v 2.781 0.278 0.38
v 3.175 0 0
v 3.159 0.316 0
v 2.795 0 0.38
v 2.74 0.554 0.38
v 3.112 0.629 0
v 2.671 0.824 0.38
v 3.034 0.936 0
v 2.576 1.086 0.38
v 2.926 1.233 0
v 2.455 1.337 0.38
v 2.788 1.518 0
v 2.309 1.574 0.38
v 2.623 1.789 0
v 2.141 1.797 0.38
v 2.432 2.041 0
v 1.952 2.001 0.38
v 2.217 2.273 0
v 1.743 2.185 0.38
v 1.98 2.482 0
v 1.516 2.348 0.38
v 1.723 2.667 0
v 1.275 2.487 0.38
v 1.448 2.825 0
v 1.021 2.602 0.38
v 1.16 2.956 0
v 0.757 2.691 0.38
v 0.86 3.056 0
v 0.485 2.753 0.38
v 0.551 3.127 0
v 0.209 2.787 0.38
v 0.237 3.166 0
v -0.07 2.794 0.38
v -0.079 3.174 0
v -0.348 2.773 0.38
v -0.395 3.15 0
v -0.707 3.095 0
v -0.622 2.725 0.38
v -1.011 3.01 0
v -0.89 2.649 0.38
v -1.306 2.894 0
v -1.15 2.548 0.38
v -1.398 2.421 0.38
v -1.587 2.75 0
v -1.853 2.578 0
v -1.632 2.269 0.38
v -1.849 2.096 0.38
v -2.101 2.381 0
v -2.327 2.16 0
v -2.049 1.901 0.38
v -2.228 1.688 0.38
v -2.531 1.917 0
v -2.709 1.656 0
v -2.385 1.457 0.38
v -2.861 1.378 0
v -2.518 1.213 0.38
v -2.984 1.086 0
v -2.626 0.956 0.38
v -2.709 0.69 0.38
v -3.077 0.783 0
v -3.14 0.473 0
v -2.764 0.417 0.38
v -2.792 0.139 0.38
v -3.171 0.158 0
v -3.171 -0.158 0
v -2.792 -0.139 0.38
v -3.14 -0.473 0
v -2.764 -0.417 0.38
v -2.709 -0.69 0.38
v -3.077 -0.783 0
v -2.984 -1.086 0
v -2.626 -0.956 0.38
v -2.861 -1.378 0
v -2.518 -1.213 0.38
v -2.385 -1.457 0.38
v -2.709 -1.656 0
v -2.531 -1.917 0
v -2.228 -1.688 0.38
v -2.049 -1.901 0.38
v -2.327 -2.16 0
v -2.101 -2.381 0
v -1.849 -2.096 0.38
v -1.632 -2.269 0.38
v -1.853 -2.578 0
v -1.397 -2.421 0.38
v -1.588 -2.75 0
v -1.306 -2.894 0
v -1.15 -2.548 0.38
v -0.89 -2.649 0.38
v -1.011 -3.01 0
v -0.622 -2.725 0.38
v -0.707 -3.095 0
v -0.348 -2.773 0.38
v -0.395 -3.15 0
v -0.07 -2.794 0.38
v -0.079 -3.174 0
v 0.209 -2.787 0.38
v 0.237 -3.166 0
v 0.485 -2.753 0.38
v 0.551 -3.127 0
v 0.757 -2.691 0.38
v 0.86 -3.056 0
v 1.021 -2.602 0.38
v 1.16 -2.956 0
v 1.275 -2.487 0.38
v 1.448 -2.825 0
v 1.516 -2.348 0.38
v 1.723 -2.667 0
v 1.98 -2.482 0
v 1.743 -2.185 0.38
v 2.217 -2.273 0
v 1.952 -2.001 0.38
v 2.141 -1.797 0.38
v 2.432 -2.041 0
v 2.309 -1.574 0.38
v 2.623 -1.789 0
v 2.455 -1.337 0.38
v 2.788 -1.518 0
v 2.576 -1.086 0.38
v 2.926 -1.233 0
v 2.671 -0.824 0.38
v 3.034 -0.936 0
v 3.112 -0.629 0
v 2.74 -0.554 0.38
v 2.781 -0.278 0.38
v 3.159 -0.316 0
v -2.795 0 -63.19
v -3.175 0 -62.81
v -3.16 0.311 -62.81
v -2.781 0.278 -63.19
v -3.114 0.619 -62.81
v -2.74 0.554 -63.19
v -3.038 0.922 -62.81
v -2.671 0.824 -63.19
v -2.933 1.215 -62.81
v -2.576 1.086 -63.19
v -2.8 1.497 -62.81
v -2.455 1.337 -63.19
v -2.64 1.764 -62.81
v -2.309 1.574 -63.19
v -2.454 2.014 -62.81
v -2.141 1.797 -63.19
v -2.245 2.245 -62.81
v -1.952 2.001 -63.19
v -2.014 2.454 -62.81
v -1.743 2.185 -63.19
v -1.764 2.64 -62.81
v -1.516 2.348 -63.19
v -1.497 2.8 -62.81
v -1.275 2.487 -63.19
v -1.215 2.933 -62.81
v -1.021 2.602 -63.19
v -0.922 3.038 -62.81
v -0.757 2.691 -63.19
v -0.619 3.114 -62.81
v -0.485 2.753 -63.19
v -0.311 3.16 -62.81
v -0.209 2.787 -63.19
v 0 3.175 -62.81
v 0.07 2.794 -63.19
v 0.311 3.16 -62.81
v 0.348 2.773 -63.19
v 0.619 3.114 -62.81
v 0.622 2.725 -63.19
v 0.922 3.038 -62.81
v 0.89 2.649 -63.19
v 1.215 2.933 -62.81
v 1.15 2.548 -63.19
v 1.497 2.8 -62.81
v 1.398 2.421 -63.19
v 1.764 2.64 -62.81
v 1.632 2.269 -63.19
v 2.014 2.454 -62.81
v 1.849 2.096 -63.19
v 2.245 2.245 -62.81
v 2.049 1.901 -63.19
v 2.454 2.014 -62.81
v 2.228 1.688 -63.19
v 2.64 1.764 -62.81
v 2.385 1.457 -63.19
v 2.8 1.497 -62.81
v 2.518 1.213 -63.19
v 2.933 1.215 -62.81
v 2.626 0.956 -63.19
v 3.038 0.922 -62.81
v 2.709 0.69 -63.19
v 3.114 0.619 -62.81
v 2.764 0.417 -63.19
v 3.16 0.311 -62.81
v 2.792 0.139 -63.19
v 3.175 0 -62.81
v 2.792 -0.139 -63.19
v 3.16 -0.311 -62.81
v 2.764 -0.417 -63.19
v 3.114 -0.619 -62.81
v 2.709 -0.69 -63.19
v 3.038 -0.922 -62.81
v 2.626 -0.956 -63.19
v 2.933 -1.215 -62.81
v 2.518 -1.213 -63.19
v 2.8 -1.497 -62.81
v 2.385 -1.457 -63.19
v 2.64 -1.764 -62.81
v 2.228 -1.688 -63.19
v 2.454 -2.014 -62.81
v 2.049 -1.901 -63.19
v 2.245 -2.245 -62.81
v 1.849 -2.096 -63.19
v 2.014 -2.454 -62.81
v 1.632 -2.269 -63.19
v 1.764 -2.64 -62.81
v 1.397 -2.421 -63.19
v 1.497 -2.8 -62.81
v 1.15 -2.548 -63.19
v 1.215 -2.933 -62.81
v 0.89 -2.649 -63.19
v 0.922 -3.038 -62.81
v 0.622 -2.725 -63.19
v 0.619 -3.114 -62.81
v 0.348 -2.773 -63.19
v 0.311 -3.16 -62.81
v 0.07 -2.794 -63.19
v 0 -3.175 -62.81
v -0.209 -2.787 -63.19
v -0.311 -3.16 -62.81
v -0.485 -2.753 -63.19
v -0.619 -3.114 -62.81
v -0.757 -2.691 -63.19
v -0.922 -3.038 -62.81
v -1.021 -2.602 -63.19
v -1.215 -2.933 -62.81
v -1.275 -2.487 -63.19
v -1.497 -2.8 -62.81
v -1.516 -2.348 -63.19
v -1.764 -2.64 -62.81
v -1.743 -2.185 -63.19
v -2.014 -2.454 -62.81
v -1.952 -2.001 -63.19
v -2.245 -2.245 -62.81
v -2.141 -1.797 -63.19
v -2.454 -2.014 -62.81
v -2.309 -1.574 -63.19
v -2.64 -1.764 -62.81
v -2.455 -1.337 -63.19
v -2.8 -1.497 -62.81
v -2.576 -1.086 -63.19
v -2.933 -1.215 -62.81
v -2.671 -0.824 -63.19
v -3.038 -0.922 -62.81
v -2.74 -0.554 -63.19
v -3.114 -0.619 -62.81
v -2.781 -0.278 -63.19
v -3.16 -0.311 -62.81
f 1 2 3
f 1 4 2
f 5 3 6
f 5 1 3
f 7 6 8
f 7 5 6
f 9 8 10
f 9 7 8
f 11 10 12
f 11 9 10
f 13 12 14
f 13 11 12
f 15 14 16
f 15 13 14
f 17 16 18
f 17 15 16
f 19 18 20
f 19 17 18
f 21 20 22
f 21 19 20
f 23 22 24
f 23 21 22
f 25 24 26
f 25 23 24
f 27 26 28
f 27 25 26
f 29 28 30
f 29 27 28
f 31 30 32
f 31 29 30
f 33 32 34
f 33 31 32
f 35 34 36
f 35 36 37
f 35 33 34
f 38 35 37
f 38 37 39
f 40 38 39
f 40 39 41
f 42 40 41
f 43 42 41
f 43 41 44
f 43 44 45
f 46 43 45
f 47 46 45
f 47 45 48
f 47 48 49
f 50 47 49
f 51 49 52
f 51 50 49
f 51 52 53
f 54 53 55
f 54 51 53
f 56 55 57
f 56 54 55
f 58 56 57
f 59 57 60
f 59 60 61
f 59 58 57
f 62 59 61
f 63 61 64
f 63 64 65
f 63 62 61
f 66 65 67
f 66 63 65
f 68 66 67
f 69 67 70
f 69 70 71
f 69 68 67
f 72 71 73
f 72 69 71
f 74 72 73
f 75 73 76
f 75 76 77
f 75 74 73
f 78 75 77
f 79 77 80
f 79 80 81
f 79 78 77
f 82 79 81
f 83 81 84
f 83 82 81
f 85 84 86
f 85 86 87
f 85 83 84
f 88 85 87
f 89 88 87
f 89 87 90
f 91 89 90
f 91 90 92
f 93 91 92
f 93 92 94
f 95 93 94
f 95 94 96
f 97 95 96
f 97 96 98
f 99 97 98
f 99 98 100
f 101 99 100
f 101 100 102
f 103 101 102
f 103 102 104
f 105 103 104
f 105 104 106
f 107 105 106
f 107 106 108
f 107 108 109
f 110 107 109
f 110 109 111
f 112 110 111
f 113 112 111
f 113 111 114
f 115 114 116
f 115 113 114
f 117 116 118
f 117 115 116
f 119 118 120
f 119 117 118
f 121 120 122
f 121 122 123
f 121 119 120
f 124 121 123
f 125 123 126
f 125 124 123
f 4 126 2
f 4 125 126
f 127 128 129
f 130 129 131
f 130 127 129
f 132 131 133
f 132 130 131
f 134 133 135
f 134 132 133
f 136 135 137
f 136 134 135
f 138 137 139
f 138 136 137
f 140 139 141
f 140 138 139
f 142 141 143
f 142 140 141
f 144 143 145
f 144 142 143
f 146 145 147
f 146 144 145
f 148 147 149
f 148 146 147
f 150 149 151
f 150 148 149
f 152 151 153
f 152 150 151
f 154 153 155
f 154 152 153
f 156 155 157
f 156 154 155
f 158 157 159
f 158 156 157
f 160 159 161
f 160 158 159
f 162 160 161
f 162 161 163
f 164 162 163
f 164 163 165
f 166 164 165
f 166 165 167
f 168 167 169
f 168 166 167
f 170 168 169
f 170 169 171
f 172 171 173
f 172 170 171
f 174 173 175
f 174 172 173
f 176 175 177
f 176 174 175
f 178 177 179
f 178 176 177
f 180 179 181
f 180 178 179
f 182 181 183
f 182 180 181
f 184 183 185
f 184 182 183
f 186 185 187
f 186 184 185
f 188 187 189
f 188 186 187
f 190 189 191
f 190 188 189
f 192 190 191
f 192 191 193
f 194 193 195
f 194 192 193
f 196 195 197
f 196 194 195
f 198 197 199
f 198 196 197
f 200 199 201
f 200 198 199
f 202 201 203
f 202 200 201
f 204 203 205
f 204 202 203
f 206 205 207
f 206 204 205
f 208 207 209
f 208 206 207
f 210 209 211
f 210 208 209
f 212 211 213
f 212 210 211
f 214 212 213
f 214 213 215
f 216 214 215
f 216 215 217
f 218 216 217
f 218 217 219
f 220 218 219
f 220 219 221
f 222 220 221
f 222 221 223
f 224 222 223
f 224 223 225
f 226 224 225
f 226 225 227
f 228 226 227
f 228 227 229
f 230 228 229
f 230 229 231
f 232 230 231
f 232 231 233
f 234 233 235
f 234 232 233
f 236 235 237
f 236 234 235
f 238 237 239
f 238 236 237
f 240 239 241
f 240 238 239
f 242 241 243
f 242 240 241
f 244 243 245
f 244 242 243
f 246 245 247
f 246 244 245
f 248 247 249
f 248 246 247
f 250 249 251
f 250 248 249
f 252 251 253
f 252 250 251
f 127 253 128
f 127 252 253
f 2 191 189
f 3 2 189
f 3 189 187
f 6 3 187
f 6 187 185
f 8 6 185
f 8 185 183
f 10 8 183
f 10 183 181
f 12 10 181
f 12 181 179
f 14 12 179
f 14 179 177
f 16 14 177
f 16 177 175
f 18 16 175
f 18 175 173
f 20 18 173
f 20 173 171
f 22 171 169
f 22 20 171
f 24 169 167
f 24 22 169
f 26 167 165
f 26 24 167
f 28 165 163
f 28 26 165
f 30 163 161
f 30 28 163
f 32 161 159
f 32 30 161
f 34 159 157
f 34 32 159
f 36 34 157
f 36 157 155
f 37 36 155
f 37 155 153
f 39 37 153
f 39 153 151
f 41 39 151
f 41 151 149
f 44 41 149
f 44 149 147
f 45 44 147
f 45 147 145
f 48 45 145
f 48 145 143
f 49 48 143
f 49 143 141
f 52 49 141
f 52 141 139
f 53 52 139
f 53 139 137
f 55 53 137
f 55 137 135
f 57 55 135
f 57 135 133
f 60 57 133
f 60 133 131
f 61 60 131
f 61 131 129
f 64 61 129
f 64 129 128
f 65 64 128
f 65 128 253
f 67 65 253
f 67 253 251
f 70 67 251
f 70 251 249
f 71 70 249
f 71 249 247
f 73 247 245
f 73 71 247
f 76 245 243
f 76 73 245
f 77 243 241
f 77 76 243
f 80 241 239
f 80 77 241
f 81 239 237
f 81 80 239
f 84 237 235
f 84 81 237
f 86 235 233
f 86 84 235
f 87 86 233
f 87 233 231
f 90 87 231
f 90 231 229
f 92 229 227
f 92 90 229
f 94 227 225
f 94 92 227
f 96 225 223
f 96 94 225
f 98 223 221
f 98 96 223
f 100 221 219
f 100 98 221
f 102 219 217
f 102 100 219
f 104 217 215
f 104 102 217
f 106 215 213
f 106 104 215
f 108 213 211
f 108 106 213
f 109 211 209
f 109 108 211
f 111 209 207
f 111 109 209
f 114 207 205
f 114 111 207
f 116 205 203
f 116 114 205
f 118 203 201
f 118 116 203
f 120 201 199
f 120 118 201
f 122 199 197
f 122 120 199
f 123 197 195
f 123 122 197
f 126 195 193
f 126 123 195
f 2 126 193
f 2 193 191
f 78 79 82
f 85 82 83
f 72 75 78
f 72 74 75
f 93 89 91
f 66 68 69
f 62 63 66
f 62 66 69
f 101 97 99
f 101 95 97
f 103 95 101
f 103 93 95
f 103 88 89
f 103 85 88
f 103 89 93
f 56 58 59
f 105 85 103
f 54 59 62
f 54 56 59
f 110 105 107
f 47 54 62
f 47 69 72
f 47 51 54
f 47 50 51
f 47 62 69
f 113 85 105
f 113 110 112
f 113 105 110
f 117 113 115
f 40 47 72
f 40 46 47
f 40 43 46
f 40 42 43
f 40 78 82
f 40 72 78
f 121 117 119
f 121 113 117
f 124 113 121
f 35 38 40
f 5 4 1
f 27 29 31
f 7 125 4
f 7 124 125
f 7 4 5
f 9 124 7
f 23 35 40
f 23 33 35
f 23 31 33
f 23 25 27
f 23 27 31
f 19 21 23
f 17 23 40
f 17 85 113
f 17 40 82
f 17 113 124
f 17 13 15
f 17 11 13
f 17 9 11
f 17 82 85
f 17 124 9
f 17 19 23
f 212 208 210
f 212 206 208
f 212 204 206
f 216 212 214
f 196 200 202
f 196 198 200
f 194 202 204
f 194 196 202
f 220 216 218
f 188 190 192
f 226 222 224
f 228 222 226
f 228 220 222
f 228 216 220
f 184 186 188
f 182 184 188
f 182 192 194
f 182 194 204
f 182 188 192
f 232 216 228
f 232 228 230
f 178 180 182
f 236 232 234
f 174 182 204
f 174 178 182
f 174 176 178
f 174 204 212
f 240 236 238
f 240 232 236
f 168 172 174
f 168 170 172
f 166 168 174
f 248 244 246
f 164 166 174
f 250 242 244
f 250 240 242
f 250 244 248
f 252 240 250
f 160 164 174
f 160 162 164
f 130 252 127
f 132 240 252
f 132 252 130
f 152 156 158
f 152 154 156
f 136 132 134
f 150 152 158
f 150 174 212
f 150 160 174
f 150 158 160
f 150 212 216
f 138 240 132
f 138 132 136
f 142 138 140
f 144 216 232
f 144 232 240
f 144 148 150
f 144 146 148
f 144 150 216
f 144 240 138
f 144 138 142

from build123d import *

# Parameters (mm, degrees)
SKETCH2_R           = 3.175
BOSS_EXTRUDE1_DEPTH = 62.81
SKETCH3_R           = 3.175
BOSS_EXTRUDE2_DEPTH = 0.38
BOSS_EXTRUDE2_TAPER = 45
SKETCH4_R           = 3.175
BOSS_EXTRUDE3_DEPTH = 0.38
BOSS_EXTRUDE3_TAPER = 45


with BuildPart() as part:
    # Sketch2 → Boss-Extrude1 (new body)
    with BuildSketch(Plane.XY):
        Circle(SKETCH2_R)
    extrude(amount=-BOSS_EXTRUDE1_DEPTH)

    # Sketch3 → Boss-Extrude2 (add)
    with BuildSketch(Plane.XY):
        Circle(SKETCH3_R)
    extrude(amount=BOSS_EXTRUDE2_DEPTH, taper=BOSS_EXTRUDE2_TAPER)

    # Sketch4 → Boss-Extrude3 (add)
    with BuildSketch(Plane(origin=(0, 0, -62.81), x_dir=(-1, 0, 0), z_dir=(0, 0, -1))):
        Circle(SKETCH4_R)
    extrude(amount=BOSS_EXTRUDE3_DEPTH, taper=BOSS_EXTRUDE3_TAPER)


solid = part.part
